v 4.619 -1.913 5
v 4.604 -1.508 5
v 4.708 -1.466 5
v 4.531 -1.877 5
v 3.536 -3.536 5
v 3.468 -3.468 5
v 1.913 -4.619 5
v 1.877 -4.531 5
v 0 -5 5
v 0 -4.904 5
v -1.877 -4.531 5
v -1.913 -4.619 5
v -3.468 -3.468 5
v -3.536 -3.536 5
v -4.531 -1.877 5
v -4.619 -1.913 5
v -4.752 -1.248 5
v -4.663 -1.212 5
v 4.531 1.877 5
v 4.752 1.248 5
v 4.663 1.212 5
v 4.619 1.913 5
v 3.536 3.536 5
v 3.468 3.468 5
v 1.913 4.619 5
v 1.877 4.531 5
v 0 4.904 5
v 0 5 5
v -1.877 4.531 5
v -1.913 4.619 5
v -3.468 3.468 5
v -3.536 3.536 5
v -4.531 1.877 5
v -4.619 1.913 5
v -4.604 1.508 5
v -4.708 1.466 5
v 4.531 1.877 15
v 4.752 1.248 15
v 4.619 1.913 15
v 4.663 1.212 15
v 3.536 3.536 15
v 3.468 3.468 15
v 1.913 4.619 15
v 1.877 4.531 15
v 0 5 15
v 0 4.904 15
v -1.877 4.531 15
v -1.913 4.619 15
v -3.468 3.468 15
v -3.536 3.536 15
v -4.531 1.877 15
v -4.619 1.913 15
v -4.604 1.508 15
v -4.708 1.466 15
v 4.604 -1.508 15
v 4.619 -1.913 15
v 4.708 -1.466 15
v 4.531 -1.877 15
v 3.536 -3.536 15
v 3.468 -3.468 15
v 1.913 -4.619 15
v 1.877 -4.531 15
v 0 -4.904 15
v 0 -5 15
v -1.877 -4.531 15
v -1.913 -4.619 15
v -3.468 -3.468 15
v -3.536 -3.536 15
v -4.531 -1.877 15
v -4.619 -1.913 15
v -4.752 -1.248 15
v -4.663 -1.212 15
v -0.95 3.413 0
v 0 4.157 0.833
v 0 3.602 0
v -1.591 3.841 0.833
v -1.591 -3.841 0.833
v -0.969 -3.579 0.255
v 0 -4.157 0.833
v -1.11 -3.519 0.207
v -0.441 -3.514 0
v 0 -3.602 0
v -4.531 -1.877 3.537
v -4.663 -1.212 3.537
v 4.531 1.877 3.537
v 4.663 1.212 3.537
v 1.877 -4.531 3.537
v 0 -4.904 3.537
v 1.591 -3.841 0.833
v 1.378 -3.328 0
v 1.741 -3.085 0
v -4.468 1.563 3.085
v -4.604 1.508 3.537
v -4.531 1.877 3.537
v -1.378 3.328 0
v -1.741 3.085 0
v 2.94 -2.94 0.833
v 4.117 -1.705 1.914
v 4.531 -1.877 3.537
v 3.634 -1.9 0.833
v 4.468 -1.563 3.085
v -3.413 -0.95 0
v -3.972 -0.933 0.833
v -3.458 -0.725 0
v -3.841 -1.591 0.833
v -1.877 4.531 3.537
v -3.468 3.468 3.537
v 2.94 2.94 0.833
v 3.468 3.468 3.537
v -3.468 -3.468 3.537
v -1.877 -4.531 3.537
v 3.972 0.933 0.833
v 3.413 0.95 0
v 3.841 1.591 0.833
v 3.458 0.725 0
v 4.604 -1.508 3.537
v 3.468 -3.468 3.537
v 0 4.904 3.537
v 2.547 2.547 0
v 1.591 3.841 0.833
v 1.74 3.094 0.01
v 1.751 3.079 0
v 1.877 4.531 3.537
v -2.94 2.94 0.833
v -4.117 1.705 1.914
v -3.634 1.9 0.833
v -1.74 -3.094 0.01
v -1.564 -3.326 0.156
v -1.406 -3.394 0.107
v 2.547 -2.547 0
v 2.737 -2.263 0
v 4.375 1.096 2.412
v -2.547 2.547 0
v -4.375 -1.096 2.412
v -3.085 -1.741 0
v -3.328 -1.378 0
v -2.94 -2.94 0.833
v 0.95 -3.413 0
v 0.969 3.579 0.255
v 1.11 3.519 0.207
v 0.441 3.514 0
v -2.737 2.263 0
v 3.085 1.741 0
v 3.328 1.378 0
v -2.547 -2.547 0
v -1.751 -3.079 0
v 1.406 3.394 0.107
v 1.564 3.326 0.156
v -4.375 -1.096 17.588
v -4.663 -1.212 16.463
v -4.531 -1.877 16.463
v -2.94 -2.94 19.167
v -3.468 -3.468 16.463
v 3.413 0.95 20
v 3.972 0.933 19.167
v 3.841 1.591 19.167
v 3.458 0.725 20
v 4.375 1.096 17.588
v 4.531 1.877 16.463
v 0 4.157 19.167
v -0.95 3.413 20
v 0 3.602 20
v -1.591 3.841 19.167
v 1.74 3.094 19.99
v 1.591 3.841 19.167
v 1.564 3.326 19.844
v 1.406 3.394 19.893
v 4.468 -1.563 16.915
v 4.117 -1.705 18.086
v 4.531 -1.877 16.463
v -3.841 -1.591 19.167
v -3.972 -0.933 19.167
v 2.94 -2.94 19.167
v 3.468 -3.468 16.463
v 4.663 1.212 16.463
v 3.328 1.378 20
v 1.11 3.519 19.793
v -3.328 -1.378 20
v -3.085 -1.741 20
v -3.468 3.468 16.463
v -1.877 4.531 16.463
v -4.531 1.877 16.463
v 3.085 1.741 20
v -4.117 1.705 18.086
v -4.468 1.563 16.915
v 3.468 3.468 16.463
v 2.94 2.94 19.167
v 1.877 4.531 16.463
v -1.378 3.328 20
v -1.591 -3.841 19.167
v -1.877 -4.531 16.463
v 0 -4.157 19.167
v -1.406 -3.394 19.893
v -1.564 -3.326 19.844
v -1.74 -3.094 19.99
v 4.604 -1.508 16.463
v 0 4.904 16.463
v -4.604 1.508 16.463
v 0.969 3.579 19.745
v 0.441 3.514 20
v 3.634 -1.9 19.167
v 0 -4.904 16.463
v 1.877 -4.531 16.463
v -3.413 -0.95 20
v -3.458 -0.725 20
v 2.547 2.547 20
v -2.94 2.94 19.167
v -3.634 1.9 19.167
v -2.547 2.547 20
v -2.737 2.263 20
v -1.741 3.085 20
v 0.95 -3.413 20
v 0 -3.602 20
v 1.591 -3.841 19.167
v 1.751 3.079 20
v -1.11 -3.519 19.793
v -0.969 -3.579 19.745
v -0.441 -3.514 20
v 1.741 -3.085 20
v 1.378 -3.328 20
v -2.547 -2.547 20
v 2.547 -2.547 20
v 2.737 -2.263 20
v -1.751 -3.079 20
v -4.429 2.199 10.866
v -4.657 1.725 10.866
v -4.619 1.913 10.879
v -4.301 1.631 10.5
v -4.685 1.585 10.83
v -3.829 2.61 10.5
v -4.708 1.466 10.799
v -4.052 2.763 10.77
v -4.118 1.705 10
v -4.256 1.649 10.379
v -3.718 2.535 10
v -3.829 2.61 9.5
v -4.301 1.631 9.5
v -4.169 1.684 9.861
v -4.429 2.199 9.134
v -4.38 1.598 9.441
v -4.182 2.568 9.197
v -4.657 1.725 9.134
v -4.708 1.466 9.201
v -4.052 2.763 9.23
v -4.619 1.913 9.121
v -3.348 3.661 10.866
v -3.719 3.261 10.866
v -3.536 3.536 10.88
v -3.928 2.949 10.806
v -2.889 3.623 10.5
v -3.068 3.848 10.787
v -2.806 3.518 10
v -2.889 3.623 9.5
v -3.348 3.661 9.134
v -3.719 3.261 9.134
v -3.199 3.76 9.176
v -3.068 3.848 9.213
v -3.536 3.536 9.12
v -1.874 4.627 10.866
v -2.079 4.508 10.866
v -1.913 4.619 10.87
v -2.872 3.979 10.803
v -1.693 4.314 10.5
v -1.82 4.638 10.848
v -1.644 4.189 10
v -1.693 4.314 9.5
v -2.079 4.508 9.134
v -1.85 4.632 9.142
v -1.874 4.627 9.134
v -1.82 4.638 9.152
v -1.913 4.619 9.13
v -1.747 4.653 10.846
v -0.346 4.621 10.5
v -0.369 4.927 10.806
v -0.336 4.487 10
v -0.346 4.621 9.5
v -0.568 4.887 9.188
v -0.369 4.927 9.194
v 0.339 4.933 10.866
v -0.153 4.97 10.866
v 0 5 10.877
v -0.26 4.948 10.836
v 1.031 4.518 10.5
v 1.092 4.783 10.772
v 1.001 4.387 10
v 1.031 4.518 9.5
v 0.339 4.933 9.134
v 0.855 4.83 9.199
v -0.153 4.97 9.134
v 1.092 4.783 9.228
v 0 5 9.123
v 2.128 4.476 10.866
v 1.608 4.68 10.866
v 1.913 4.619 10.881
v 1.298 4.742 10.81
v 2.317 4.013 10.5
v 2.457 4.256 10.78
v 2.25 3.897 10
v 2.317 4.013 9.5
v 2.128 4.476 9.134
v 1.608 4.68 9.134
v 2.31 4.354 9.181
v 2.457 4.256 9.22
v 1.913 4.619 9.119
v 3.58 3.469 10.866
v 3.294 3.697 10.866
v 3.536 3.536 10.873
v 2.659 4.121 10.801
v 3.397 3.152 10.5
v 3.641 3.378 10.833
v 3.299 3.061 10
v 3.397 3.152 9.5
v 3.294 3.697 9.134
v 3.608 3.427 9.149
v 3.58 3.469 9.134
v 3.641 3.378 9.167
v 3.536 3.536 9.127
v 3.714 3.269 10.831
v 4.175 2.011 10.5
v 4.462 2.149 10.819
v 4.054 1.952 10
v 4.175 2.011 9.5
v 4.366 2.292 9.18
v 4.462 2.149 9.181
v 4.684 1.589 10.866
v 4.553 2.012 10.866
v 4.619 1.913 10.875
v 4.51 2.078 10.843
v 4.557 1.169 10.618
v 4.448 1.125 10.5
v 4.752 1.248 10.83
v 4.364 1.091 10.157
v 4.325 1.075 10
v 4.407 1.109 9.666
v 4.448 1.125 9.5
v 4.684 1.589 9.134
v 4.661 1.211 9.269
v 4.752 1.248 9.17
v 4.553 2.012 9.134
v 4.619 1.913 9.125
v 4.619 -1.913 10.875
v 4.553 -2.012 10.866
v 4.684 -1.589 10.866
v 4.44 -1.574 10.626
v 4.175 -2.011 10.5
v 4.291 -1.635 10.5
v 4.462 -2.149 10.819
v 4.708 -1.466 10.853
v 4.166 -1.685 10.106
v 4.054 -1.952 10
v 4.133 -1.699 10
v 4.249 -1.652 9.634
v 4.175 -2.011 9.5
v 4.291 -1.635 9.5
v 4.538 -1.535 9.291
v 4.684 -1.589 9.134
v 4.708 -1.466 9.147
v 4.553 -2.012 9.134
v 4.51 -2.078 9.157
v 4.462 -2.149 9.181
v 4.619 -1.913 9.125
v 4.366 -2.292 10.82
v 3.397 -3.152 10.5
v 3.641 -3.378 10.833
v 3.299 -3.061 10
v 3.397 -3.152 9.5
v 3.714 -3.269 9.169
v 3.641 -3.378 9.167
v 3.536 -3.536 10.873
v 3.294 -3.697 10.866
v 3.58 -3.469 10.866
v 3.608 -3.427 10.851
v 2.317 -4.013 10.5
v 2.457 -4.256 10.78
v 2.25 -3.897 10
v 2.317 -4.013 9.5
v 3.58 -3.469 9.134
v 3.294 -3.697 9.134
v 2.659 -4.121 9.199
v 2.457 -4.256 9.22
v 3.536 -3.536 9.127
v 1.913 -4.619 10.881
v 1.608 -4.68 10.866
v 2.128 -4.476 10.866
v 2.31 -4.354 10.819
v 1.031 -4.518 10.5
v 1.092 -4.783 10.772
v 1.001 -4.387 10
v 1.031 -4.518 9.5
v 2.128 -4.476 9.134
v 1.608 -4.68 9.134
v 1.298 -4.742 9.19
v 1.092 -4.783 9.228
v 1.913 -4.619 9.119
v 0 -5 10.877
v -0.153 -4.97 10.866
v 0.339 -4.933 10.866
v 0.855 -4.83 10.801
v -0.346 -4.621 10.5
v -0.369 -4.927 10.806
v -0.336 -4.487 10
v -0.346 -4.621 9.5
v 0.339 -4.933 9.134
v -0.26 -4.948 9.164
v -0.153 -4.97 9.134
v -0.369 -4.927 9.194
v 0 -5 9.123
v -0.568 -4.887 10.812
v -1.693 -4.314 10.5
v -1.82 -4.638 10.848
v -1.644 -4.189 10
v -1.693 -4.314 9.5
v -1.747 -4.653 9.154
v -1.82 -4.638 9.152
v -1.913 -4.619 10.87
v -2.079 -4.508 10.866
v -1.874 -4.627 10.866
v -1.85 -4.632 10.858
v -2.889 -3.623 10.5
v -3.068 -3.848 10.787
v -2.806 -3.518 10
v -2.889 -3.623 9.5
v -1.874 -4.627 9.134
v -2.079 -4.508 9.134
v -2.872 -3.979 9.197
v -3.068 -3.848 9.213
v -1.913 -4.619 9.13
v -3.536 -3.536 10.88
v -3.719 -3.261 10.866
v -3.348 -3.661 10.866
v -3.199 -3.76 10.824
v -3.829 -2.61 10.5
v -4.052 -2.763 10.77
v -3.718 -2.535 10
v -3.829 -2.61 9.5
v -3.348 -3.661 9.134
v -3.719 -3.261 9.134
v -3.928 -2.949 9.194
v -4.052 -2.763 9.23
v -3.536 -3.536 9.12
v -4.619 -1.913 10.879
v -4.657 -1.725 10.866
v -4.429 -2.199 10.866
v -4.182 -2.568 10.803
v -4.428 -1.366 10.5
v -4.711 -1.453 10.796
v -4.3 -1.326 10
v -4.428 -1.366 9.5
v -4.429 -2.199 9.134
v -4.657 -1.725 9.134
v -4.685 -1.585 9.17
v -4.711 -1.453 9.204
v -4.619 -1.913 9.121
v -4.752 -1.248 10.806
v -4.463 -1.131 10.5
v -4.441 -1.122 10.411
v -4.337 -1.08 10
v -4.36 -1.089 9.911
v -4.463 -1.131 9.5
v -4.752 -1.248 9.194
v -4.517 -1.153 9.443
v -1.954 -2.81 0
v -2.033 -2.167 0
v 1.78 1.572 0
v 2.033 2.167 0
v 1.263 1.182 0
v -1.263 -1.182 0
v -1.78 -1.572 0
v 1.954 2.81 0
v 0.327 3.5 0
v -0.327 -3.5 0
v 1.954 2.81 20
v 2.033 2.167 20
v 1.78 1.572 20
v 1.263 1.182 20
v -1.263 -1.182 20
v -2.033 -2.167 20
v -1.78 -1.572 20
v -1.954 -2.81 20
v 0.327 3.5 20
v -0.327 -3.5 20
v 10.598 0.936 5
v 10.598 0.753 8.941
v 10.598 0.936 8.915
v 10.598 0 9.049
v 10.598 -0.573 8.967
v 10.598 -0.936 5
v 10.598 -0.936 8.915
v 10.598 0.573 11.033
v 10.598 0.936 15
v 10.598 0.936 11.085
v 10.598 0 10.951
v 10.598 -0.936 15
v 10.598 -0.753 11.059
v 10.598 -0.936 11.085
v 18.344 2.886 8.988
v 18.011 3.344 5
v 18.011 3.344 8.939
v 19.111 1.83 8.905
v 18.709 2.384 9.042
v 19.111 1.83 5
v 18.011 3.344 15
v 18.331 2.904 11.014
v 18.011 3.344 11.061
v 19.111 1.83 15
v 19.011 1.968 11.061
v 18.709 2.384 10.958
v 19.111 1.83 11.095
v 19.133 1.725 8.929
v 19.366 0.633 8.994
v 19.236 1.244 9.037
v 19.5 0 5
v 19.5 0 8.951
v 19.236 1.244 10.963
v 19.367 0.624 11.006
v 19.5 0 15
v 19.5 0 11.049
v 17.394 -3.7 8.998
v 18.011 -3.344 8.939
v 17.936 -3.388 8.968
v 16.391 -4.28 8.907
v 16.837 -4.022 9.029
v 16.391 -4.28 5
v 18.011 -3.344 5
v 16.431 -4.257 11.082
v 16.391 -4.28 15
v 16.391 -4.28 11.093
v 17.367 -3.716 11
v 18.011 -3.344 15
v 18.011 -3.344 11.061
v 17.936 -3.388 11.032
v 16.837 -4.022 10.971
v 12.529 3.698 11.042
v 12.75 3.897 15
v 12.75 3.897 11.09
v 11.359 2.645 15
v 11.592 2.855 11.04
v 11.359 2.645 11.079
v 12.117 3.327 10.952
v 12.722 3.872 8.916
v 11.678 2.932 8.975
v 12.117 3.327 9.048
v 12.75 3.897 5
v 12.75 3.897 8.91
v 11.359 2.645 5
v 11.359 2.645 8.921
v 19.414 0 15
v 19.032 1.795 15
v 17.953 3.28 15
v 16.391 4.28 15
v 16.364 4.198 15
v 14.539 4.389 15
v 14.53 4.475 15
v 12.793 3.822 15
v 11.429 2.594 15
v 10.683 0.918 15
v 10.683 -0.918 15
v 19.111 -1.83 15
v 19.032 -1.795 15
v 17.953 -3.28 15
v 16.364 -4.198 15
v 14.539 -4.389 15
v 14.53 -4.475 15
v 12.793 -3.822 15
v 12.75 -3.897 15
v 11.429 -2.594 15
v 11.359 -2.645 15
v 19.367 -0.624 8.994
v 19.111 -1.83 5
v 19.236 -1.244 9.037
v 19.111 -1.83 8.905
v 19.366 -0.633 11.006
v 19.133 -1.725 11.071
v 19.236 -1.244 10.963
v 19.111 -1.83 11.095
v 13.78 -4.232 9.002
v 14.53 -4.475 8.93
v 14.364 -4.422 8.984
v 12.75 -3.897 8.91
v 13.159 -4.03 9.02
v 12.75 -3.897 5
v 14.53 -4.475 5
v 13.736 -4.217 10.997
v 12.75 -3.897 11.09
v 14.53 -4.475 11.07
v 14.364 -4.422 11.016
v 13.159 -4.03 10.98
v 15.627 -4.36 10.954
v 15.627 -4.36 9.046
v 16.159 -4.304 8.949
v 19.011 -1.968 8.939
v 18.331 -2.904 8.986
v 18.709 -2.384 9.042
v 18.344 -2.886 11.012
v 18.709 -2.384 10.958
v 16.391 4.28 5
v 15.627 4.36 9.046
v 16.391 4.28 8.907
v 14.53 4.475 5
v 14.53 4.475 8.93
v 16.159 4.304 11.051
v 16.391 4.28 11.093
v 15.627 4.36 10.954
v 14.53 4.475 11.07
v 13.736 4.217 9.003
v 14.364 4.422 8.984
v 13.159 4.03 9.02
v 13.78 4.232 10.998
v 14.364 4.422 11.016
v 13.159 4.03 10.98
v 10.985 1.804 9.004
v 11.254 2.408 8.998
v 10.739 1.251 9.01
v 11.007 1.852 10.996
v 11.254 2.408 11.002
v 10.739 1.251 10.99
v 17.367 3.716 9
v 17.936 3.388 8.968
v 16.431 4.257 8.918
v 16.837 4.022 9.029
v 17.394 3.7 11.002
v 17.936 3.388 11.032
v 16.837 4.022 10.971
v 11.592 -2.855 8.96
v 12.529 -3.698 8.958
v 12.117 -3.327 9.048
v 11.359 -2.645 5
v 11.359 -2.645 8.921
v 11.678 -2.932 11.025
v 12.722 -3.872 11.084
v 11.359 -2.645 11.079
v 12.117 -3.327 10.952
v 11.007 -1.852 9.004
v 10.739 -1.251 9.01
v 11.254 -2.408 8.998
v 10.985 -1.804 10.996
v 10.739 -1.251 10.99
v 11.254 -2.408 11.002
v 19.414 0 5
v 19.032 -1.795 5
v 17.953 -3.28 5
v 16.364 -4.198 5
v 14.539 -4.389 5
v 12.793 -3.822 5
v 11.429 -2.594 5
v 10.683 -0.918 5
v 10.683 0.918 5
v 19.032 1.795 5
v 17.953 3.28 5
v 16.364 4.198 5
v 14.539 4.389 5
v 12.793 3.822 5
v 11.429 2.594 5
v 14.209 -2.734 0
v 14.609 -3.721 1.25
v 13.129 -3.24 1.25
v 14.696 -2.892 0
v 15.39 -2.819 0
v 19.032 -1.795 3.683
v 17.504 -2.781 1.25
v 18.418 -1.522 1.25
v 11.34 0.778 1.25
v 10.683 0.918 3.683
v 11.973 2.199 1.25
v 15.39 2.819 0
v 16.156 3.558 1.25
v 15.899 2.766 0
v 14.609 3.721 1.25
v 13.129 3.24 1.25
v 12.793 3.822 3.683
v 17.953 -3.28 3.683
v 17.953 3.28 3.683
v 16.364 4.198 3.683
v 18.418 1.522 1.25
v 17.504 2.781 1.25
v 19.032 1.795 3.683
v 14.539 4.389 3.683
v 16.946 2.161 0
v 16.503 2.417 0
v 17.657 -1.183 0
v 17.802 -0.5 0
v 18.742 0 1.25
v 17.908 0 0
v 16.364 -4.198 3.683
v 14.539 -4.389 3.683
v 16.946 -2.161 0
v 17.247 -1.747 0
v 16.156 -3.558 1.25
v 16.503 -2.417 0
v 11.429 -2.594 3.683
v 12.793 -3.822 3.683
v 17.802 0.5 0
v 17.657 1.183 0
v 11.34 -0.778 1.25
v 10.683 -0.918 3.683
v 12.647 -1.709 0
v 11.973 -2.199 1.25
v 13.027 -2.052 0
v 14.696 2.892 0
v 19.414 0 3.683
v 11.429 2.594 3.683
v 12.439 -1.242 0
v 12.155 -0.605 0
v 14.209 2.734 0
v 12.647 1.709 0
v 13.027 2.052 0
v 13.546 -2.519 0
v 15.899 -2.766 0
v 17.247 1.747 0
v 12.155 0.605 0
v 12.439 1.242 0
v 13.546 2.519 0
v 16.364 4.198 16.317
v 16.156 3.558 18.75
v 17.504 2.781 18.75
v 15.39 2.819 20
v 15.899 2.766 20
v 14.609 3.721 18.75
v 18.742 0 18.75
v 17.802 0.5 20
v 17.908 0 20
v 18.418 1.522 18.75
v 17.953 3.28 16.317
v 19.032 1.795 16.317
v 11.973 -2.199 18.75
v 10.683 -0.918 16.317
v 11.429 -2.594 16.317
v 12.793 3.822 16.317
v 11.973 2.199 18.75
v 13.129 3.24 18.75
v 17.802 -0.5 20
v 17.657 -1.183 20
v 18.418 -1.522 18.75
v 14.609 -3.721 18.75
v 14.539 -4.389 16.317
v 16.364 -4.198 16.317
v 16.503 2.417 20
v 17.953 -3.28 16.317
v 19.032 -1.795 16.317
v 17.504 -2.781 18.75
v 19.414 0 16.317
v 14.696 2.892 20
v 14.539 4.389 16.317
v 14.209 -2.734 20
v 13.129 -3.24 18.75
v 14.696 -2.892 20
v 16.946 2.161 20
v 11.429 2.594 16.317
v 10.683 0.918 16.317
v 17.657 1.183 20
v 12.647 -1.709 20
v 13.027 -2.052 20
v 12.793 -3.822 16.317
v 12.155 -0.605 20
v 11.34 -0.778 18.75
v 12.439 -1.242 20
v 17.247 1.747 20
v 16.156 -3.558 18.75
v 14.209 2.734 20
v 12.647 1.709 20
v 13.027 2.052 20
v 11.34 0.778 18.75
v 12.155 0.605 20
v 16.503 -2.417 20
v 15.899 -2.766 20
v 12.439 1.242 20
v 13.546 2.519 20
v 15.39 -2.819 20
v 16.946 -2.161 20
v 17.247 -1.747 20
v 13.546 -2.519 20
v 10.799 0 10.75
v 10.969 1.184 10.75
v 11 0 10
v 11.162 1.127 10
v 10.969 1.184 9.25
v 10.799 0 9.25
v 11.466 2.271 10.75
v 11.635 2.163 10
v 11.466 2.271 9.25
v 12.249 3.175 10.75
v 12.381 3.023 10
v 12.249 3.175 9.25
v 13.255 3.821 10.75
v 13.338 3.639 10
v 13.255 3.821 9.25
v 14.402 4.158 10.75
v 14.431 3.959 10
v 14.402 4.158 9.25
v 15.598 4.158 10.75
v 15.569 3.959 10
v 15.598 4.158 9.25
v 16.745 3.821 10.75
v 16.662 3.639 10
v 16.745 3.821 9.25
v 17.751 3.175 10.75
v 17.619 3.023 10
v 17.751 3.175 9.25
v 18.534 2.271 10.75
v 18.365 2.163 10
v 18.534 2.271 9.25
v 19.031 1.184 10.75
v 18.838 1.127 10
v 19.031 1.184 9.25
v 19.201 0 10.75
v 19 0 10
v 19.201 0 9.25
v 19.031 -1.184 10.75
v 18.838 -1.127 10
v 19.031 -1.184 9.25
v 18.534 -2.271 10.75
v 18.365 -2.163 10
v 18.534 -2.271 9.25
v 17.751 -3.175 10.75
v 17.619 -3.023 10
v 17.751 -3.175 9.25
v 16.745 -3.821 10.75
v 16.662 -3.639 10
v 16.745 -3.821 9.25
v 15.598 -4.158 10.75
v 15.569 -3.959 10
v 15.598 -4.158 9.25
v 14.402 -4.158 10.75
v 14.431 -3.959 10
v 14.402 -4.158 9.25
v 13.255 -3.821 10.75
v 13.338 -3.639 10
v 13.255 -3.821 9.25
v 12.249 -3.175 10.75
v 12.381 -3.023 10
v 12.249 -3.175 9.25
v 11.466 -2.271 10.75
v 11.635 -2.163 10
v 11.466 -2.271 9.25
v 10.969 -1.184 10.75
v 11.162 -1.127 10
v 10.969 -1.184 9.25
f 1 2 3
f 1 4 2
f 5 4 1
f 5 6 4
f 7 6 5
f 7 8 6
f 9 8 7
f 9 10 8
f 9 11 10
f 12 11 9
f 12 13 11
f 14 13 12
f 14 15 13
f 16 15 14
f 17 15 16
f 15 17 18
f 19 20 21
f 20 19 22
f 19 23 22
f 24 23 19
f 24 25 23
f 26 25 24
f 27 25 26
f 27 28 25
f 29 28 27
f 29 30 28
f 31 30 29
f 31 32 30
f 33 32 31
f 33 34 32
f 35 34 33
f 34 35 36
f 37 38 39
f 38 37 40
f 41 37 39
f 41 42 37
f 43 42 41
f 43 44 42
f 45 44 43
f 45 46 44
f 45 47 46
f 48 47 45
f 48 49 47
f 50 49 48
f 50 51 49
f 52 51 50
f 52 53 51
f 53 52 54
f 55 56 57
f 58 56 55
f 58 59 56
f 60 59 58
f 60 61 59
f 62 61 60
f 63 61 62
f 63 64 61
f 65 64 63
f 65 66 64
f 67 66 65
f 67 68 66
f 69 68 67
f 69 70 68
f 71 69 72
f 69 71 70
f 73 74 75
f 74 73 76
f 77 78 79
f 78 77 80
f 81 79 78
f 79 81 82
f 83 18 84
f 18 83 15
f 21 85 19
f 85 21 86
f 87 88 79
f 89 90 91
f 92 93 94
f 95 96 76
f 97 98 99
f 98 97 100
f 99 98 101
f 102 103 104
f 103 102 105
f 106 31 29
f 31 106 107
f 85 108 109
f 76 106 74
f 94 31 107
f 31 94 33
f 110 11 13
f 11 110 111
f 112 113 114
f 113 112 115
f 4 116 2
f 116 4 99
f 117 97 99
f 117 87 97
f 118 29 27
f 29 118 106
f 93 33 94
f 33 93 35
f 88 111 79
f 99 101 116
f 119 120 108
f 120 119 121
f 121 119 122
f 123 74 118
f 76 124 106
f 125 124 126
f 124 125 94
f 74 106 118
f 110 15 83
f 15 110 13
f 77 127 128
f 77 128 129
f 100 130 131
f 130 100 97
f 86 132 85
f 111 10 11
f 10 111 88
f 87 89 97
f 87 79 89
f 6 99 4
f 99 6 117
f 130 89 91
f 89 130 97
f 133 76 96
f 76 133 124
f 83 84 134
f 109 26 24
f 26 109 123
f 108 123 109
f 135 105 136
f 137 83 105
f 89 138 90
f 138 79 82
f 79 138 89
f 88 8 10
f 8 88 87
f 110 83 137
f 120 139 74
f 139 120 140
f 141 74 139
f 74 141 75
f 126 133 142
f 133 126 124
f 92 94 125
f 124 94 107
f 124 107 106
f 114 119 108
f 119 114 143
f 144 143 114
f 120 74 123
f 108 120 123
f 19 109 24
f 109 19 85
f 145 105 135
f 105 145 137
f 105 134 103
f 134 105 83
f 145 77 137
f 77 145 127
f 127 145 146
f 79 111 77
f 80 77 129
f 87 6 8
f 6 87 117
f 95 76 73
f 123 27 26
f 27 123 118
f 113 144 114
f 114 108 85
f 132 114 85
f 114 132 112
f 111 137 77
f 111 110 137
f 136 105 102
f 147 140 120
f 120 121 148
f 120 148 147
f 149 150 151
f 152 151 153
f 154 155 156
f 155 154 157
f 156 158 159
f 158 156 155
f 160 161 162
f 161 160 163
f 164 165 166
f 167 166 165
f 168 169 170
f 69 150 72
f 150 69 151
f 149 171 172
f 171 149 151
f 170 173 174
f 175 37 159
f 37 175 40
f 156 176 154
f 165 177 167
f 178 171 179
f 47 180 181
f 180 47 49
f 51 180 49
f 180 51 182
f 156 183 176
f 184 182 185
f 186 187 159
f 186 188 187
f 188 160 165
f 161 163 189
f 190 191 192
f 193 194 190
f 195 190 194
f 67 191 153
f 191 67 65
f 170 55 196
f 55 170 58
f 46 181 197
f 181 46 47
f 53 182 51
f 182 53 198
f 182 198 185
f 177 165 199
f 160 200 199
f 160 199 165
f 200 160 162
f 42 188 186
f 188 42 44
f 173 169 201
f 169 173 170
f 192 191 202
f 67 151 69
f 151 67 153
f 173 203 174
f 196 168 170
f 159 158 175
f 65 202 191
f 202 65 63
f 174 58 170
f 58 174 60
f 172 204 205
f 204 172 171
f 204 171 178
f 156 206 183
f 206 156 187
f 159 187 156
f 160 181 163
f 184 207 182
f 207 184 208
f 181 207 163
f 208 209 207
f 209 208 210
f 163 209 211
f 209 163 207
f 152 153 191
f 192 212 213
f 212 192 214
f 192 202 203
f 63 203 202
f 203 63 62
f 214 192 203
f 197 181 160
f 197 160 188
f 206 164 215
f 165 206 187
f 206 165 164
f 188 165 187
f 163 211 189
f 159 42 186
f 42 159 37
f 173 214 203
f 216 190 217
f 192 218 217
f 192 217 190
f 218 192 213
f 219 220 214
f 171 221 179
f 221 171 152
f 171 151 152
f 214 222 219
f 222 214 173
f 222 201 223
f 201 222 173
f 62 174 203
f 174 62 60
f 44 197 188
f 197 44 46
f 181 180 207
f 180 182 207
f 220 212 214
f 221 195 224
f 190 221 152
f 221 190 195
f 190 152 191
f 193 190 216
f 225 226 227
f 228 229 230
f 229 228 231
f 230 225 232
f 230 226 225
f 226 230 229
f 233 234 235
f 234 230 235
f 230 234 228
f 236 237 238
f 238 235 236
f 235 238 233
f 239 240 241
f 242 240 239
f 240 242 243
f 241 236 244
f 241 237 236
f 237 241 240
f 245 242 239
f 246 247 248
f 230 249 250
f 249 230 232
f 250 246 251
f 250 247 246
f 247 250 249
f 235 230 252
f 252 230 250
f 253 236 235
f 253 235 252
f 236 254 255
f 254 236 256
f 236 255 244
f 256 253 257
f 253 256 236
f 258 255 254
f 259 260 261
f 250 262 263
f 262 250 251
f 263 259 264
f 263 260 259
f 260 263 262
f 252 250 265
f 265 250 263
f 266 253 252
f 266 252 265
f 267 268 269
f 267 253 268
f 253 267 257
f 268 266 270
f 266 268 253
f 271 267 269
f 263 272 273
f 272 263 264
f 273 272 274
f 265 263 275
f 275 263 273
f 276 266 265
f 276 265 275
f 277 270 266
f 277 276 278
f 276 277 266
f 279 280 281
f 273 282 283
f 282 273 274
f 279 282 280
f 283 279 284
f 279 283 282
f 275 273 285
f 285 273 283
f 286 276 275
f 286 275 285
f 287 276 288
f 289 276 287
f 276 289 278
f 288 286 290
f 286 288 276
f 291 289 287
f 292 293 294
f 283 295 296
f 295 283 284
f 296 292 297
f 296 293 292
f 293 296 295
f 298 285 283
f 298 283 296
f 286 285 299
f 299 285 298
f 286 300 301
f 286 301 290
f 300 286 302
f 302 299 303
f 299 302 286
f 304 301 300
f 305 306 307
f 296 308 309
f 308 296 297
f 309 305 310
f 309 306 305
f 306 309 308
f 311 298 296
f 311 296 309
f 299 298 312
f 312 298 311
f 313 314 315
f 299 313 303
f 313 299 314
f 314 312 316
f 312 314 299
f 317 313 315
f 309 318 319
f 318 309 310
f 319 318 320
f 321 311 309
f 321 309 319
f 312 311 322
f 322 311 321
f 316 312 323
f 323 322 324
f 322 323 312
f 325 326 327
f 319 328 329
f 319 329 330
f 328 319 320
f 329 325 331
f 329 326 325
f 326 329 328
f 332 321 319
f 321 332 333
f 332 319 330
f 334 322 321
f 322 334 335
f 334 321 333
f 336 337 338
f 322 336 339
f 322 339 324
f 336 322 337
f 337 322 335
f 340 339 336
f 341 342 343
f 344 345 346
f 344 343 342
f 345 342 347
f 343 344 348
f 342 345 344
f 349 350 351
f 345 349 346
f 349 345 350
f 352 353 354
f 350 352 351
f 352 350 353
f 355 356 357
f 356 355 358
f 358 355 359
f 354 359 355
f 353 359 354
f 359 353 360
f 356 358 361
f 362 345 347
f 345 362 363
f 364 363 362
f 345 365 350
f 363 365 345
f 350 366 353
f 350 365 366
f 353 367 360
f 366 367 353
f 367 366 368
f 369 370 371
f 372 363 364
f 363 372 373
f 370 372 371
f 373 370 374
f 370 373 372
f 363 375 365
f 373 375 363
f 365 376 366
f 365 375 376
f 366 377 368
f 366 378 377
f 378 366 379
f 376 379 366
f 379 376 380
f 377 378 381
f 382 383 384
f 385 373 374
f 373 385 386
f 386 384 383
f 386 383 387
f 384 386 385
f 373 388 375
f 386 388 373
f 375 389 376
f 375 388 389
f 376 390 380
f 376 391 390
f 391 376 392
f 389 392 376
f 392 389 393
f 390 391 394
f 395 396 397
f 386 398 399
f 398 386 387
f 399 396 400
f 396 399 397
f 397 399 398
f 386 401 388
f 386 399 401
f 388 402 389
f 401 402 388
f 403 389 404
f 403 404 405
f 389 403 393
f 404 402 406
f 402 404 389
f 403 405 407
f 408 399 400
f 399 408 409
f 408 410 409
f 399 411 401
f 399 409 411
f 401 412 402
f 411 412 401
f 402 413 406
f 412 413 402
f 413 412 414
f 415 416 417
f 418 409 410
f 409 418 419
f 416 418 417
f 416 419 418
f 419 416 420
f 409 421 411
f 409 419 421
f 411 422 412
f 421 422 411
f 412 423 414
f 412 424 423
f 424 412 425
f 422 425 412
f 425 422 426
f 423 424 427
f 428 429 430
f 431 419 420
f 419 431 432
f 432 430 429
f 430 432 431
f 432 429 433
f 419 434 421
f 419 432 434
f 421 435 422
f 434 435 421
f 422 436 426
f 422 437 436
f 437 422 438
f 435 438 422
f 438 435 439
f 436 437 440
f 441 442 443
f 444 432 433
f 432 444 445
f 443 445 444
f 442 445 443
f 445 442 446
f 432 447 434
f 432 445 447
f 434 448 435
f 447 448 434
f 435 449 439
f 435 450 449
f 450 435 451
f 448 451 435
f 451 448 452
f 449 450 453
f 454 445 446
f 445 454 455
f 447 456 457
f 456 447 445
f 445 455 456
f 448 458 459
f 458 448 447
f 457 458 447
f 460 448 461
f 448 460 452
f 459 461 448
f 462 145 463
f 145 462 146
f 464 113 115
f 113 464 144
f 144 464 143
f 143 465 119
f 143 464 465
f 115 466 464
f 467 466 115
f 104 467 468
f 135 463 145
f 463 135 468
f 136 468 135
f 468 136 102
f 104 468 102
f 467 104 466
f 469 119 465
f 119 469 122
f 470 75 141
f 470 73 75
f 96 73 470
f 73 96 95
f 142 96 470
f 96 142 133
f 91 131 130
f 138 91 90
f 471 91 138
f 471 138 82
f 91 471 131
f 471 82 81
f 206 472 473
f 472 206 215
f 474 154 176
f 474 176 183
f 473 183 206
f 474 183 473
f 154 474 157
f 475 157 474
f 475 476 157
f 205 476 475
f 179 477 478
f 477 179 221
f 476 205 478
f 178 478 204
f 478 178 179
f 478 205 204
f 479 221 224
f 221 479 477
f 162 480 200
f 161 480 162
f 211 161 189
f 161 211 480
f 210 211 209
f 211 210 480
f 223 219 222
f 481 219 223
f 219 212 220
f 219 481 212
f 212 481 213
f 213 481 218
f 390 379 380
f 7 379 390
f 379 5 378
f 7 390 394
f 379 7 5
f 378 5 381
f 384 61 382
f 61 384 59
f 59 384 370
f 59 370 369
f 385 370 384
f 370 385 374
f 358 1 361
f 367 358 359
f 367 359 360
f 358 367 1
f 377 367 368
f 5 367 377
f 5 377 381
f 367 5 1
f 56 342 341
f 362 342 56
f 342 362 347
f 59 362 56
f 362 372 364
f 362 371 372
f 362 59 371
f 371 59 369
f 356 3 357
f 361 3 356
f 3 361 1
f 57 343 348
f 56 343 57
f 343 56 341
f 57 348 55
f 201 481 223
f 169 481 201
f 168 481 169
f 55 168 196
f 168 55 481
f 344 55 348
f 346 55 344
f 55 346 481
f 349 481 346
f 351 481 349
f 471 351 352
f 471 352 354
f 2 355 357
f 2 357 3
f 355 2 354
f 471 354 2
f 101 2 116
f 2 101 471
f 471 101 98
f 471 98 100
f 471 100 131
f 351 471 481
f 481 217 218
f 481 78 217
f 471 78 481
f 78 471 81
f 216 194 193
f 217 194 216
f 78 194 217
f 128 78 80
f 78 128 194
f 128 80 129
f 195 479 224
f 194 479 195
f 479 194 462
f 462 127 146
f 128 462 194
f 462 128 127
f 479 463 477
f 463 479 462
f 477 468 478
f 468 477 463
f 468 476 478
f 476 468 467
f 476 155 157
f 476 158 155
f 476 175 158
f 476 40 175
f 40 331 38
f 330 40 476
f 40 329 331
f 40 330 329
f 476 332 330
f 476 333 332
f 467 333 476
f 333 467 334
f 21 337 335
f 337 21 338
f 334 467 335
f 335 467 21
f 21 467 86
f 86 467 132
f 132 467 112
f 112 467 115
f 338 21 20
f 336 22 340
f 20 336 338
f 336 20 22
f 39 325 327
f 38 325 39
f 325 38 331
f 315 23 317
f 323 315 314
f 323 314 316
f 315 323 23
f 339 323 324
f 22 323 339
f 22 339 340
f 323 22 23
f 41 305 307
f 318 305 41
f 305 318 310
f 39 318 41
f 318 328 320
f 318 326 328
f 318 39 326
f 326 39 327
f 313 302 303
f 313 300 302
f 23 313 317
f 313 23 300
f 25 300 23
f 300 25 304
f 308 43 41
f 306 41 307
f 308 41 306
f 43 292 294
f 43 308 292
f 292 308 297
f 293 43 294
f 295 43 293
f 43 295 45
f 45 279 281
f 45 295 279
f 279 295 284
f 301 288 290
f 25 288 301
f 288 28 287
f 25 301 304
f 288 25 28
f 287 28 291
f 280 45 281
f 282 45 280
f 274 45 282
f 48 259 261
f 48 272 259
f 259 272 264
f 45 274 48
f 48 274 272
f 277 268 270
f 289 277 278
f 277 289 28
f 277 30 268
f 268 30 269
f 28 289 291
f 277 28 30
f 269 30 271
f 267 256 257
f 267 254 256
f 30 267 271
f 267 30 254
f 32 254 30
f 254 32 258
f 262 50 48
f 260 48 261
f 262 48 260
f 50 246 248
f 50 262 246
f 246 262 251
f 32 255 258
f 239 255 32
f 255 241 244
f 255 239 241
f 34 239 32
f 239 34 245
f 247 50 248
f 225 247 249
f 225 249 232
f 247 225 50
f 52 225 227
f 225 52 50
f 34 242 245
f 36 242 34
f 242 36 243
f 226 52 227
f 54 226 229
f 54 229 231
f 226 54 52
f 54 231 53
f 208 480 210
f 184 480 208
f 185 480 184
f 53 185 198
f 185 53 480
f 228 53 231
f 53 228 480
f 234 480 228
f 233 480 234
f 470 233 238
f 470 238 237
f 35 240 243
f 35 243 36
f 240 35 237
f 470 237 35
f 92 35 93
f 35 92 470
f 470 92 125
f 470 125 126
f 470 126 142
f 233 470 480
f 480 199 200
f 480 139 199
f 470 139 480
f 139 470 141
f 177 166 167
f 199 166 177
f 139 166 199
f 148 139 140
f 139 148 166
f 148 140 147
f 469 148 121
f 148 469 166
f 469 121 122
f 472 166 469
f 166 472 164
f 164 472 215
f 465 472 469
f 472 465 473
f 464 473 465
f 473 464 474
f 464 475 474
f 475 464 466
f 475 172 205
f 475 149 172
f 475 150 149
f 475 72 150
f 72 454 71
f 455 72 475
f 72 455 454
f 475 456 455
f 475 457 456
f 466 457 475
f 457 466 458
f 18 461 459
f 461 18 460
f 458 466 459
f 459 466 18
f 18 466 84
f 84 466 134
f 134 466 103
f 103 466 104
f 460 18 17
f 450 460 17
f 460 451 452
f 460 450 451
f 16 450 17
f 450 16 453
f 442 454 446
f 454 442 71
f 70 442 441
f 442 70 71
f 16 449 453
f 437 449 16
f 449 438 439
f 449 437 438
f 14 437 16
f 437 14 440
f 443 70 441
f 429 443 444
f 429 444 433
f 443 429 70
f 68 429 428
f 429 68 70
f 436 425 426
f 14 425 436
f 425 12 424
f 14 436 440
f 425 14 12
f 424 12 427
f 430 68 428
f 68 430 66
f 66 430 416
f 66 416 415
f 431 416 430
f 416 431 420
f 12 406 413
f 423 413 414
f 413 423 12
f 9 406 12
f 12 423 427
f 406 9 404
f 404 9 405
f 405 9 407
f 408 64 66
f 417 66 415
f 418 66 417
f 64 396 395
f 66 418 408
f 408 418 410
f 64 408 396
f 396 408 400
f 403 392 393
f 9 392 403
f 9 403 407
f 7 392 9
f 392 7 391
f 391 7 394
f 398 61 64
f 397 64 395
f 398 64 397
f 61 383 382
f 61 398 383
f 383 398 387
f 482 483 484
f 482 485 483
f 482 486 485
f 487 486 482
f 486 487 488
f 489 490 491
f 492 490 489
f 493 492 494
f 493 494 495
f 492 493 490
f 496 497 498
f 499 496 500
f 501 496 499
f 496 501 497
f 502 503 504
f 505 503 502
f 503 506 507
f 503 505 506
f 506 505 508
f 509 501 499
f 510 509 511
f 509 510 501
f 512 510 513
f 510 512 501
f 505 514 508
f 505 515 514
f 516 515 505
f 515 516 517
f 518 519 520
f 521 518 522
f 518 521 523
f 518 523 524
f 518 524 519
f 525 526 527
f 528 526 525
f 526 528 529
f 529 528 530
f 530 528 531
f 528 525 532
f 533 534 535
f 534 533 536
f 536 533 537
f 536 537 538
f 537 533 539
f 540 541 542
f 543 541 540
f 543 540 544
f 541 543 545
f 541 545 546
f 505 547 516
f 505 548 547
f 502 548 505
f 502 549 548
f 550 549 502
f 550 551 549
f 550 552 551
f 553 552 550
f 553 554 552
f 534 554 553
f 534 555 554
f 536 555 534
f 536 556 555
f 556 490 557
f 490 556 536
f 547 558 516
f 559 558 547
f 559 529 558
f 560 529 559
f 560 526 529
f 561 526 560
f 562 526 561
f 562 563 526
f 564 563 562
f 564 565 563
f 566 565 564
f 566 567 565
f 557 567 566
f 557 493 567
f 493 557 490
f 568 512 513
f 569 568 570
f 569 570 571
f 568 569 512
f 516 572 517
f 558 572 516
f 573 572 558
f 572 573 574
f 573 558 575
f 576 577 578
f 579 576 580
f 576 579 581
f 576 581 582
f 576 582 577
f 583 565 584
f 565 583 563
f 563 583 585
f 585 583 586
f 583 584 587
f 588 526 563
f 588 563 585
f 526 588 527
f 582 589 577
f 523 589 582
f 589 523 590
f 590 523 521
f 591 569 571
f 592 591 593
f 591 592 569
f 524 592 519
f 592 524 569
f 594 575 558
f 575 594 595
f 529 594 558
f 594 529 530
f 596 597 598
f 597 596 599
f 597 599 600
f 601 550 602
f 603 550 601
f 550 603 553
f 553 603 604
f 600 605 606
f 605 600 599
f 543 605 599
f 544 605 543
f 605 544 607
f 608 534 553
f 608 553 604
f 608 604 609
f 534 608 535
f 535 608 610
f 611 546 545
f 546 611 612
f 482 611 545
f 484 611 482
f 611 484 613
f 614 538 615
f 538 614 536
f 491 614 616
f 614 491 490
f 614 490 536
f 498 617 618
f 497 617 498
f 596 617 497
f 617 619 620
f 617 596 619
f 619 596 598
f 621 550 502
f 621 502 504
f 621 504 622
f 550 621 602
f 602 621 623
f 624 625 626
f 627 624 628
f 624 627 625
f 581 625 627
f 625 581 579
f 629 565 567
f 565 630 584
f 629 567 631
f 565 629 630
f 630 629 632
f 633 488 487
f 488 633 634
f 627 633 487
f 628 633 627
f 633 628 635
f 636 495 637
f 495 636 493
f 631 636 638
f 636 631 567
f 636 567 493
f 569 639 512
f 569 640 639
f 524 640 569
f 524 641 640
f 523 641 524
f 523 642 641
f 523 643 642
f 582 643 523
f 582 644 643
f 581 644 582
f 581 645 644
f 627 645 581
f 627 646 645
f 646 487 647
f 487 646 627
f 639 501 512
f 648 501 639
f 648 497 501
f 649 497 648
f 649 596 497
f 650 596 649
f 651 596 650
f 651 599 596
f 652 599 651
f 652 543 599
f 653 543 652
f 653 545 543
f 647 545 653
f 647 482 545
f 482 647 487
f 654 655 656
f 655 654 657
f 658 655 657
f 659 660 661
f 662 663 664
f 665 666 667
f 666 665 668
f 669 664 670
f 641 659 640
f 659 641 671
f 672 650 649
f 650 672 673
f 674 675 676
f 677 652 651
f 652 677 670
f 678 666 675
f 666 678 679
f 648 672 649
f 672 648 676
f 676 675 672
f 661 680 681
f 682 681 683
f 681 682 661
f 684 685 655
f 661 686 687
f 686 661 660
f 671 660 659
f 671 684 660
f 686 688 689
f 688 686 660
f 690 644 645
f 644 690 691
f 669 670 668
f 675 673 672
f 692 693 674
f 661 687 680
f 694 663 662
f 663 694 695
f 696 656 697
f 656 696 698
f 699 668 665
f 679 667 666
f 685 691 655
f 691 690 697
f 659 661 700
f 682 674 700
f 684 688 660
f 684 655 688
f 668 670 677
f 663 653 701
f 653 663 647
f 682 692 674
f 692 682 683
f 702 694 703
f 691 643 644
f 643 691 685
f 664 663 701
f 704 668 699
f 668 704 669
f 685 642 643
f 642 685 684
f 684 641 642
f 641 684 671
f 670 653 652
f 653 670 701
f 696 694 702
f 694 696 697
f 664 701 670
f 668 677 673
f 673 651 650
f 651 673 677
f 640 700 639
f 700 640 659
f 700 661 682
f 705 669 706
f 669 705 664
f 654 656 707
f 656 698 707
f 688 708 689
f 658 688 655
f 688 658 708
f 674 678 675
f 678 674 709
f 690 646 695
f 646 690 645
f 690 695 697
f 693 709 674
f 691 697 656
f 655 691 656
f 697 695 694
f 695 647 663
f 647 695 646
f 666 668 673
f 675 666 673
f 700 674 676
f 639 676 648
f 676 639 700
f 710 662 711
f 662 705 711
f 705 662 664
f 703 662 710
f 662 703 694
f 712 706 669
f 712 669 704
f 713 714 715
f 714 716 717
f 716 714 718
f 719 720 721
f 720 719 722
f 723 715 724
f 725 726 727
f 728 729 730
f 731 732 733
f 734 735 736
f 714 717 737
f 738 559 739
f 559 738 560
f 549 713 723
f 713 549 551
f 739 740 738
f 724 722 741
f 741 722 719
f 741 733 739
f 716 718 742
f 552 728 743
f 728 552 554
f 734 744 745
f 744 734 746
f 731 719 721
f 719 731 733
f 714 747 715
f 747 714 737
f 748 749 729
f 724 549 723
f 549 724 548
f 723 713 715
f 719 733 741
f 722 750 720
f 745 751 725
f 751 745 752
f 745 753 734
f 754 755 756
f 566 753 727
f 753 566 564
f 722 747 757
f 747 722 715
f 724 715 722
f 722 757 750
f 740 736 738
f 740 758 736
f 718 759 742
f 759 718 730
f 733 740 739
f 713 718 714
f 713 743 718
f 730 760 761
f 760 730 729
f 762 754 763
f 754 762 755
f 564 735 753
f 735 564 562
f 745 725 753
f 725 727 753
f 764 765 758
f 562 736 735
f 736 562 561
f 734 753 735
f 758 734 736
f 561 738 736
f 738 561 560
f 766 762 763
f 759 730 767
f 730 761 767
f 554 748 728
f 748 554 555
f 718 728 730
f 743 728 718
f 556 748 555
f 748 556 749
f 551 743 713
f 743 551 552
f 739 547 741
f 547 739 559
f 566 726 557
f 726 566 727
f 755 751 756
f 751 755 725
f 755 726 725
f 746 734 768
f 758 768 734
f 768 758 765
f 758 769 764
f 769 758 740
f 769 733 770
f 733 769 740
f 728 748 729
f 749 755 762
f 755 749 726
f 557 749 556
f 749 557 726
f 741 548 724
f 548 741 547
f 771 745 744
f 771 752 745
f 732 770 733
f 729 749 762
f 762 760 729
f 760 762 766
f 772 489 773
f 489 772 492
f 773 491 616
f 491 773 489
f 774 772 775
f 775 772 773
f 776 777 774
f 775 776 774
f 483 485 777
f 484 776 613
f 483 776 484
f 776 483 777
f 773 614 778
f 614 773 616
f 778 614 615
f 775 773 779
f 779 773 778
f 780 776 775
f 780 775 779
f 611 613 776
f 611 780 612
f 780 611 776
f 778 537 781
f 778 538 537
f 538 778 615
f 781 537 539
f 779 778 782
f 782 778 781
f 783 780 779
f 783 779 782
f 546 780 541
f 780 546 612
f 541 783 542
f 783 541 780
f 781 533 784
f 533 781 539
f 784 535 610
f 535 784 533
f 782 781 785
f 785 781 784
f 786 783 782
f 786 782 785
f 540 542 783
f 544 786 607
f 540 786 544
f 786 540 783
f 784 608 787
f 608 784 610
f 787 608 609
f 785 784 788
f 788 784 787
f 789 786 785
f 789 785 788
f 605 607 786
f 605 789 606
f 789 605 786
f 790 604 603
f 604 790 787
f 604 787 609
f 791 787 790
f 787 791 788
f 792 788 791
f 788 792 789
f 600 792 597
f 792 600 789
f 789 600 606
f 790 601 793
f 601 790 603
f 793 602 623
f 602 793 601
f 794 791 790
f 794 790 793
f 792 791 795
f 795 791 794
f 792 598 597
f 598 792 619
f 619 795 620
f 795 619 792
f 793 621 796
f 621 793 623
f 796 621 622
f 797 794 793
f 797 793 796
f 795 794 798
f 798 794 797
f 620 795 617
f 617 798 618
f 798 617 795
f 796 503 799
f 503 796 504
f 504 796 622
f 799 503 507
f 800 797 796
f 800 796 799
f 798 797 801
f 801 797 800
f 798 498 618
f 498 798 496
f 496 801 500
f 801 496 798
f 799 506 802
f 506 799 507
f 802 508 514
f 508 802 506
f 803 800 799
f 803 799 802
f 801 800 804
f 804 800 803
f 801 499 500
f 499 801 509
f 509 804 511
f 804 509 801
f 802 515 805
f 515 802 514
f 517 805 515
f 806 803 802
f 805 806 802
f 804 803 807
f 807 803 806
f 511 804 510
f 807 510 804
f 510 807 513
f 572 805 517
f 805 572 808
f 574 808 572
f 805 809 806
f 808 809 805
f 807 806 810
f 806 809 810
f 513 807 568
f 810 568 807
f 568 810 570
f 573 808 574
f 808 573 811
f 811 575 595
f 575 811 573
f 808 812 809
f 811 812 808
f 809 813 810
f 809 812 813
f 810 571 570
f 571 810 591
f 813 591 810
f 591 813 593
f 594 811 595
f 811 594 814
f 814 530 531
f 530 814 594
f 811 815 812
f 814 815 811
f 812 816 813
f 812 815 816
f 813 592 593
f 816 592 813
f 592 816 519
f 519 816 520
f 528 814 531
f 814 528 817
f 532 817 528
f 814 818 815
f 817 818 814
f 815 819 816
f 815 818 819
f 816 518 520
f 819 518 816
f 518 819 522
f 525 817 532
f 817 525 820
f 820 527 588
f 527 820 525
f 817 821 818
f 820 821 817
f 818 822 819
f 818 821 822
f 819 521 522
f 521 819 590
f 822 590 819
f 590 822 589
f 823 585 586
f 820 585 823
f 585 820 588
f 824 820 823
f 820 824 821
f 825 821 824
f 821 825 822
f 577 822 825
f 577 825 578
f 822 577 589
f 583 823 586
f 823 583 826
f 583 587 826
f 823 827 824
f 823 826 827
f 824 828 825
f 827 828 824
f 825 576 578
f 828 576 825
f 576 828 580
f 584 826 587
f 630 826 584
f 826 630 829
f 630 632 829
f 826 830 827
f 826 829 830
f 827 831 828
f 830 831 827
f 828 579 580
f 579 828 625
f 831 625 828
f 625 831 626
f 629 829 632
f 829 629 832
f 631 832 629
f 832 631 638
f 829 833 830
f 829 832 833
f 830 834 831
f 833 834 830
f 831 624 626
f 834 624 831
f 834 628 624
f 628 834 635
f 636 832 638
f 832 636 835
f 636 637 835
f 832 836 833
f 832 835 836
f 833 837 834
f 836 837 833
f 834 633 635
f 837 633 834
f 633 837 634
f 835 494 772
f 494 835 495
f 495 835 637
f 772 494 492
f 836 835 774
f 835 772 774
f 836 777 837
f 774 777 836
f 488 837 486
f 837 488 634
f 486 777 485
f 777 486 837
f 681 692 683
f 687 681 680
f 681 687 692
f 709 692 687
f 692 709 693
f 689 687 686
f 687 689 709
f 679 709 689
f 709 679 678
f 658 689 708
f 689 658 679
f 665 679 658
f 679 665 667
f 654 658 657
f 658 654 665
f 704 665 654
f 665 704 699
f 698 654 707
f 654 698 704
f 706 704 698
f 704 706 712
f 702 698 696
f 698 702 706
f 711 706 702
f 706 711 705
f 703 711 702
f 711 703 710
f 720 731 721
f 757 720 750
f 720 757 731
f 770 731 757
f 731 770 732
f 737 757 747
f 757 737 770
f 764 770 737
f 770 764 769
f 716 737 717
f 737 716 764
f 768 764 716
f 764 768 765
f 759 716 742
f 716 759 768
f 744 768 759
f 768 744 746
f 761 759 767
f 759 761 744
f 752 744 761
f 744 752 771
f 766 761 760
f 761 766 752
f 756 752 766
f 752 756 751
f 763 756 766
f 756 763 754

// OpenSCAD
//
//  Copyright (C) 03-06-2013 Jasper den Ouden.
//
//  This is free software: you can redistribute it and/or modify
//  it under the terms of the GNU General Public License as published
//  by the Free Software Foundation, either version 3 of the License, or
//  (at your option) any later version.
//

//The size difference between the male and female.
t=0;
//Length.
l = 20;
//Length of the top bit.
lt = 5;
//Radius.
R = 5;
//Dip.
d = 0.5;
//Number of petals.
n = 2;

module pill_sub()
{
    translate([0,0,lt]) difference()
    {   union()
        {   cylinder(r=R-t, h=l-2*lt);
            scale([1,1,1.5*lt/R]) sphere(R-t);
            translate([0,0,l-2*lt]) scale([1,1,1.5*lt/R]) sphere(R-t);
        }
        rotate_extrude() translate([R+d,l/2-lt]) circle(2*d+t, $fn=12);
        translate([0,0,-l-lt]) cube(l*[2,2,2], center=true);
        translate([0,0,2*l-lt]) cube(l*[2,2,2], center=true);
    }
}

module pill_flower()
{   difference()
    {   circle(R);
        for( a=[0:360/n:360] ) rotate(a)union()
        {   
            translate([R,0]) rotate(22) 
            {   square(R*[2.5,1/2], center=true);
                translate([-1.25*R,0]) circle(R/4, $fn=12);
            }
        }
    }
}

module pill()
{
    intersection()
    {   pill_sub(R=R,l=l,t=t,lt=lt,d=d);
        linear_extrude(height=l) pill_flower(n=n,R=R);
    }
}

pill(); 
//pill_flower();
translate([3*R,0]) pill_sub(t=0.5);
